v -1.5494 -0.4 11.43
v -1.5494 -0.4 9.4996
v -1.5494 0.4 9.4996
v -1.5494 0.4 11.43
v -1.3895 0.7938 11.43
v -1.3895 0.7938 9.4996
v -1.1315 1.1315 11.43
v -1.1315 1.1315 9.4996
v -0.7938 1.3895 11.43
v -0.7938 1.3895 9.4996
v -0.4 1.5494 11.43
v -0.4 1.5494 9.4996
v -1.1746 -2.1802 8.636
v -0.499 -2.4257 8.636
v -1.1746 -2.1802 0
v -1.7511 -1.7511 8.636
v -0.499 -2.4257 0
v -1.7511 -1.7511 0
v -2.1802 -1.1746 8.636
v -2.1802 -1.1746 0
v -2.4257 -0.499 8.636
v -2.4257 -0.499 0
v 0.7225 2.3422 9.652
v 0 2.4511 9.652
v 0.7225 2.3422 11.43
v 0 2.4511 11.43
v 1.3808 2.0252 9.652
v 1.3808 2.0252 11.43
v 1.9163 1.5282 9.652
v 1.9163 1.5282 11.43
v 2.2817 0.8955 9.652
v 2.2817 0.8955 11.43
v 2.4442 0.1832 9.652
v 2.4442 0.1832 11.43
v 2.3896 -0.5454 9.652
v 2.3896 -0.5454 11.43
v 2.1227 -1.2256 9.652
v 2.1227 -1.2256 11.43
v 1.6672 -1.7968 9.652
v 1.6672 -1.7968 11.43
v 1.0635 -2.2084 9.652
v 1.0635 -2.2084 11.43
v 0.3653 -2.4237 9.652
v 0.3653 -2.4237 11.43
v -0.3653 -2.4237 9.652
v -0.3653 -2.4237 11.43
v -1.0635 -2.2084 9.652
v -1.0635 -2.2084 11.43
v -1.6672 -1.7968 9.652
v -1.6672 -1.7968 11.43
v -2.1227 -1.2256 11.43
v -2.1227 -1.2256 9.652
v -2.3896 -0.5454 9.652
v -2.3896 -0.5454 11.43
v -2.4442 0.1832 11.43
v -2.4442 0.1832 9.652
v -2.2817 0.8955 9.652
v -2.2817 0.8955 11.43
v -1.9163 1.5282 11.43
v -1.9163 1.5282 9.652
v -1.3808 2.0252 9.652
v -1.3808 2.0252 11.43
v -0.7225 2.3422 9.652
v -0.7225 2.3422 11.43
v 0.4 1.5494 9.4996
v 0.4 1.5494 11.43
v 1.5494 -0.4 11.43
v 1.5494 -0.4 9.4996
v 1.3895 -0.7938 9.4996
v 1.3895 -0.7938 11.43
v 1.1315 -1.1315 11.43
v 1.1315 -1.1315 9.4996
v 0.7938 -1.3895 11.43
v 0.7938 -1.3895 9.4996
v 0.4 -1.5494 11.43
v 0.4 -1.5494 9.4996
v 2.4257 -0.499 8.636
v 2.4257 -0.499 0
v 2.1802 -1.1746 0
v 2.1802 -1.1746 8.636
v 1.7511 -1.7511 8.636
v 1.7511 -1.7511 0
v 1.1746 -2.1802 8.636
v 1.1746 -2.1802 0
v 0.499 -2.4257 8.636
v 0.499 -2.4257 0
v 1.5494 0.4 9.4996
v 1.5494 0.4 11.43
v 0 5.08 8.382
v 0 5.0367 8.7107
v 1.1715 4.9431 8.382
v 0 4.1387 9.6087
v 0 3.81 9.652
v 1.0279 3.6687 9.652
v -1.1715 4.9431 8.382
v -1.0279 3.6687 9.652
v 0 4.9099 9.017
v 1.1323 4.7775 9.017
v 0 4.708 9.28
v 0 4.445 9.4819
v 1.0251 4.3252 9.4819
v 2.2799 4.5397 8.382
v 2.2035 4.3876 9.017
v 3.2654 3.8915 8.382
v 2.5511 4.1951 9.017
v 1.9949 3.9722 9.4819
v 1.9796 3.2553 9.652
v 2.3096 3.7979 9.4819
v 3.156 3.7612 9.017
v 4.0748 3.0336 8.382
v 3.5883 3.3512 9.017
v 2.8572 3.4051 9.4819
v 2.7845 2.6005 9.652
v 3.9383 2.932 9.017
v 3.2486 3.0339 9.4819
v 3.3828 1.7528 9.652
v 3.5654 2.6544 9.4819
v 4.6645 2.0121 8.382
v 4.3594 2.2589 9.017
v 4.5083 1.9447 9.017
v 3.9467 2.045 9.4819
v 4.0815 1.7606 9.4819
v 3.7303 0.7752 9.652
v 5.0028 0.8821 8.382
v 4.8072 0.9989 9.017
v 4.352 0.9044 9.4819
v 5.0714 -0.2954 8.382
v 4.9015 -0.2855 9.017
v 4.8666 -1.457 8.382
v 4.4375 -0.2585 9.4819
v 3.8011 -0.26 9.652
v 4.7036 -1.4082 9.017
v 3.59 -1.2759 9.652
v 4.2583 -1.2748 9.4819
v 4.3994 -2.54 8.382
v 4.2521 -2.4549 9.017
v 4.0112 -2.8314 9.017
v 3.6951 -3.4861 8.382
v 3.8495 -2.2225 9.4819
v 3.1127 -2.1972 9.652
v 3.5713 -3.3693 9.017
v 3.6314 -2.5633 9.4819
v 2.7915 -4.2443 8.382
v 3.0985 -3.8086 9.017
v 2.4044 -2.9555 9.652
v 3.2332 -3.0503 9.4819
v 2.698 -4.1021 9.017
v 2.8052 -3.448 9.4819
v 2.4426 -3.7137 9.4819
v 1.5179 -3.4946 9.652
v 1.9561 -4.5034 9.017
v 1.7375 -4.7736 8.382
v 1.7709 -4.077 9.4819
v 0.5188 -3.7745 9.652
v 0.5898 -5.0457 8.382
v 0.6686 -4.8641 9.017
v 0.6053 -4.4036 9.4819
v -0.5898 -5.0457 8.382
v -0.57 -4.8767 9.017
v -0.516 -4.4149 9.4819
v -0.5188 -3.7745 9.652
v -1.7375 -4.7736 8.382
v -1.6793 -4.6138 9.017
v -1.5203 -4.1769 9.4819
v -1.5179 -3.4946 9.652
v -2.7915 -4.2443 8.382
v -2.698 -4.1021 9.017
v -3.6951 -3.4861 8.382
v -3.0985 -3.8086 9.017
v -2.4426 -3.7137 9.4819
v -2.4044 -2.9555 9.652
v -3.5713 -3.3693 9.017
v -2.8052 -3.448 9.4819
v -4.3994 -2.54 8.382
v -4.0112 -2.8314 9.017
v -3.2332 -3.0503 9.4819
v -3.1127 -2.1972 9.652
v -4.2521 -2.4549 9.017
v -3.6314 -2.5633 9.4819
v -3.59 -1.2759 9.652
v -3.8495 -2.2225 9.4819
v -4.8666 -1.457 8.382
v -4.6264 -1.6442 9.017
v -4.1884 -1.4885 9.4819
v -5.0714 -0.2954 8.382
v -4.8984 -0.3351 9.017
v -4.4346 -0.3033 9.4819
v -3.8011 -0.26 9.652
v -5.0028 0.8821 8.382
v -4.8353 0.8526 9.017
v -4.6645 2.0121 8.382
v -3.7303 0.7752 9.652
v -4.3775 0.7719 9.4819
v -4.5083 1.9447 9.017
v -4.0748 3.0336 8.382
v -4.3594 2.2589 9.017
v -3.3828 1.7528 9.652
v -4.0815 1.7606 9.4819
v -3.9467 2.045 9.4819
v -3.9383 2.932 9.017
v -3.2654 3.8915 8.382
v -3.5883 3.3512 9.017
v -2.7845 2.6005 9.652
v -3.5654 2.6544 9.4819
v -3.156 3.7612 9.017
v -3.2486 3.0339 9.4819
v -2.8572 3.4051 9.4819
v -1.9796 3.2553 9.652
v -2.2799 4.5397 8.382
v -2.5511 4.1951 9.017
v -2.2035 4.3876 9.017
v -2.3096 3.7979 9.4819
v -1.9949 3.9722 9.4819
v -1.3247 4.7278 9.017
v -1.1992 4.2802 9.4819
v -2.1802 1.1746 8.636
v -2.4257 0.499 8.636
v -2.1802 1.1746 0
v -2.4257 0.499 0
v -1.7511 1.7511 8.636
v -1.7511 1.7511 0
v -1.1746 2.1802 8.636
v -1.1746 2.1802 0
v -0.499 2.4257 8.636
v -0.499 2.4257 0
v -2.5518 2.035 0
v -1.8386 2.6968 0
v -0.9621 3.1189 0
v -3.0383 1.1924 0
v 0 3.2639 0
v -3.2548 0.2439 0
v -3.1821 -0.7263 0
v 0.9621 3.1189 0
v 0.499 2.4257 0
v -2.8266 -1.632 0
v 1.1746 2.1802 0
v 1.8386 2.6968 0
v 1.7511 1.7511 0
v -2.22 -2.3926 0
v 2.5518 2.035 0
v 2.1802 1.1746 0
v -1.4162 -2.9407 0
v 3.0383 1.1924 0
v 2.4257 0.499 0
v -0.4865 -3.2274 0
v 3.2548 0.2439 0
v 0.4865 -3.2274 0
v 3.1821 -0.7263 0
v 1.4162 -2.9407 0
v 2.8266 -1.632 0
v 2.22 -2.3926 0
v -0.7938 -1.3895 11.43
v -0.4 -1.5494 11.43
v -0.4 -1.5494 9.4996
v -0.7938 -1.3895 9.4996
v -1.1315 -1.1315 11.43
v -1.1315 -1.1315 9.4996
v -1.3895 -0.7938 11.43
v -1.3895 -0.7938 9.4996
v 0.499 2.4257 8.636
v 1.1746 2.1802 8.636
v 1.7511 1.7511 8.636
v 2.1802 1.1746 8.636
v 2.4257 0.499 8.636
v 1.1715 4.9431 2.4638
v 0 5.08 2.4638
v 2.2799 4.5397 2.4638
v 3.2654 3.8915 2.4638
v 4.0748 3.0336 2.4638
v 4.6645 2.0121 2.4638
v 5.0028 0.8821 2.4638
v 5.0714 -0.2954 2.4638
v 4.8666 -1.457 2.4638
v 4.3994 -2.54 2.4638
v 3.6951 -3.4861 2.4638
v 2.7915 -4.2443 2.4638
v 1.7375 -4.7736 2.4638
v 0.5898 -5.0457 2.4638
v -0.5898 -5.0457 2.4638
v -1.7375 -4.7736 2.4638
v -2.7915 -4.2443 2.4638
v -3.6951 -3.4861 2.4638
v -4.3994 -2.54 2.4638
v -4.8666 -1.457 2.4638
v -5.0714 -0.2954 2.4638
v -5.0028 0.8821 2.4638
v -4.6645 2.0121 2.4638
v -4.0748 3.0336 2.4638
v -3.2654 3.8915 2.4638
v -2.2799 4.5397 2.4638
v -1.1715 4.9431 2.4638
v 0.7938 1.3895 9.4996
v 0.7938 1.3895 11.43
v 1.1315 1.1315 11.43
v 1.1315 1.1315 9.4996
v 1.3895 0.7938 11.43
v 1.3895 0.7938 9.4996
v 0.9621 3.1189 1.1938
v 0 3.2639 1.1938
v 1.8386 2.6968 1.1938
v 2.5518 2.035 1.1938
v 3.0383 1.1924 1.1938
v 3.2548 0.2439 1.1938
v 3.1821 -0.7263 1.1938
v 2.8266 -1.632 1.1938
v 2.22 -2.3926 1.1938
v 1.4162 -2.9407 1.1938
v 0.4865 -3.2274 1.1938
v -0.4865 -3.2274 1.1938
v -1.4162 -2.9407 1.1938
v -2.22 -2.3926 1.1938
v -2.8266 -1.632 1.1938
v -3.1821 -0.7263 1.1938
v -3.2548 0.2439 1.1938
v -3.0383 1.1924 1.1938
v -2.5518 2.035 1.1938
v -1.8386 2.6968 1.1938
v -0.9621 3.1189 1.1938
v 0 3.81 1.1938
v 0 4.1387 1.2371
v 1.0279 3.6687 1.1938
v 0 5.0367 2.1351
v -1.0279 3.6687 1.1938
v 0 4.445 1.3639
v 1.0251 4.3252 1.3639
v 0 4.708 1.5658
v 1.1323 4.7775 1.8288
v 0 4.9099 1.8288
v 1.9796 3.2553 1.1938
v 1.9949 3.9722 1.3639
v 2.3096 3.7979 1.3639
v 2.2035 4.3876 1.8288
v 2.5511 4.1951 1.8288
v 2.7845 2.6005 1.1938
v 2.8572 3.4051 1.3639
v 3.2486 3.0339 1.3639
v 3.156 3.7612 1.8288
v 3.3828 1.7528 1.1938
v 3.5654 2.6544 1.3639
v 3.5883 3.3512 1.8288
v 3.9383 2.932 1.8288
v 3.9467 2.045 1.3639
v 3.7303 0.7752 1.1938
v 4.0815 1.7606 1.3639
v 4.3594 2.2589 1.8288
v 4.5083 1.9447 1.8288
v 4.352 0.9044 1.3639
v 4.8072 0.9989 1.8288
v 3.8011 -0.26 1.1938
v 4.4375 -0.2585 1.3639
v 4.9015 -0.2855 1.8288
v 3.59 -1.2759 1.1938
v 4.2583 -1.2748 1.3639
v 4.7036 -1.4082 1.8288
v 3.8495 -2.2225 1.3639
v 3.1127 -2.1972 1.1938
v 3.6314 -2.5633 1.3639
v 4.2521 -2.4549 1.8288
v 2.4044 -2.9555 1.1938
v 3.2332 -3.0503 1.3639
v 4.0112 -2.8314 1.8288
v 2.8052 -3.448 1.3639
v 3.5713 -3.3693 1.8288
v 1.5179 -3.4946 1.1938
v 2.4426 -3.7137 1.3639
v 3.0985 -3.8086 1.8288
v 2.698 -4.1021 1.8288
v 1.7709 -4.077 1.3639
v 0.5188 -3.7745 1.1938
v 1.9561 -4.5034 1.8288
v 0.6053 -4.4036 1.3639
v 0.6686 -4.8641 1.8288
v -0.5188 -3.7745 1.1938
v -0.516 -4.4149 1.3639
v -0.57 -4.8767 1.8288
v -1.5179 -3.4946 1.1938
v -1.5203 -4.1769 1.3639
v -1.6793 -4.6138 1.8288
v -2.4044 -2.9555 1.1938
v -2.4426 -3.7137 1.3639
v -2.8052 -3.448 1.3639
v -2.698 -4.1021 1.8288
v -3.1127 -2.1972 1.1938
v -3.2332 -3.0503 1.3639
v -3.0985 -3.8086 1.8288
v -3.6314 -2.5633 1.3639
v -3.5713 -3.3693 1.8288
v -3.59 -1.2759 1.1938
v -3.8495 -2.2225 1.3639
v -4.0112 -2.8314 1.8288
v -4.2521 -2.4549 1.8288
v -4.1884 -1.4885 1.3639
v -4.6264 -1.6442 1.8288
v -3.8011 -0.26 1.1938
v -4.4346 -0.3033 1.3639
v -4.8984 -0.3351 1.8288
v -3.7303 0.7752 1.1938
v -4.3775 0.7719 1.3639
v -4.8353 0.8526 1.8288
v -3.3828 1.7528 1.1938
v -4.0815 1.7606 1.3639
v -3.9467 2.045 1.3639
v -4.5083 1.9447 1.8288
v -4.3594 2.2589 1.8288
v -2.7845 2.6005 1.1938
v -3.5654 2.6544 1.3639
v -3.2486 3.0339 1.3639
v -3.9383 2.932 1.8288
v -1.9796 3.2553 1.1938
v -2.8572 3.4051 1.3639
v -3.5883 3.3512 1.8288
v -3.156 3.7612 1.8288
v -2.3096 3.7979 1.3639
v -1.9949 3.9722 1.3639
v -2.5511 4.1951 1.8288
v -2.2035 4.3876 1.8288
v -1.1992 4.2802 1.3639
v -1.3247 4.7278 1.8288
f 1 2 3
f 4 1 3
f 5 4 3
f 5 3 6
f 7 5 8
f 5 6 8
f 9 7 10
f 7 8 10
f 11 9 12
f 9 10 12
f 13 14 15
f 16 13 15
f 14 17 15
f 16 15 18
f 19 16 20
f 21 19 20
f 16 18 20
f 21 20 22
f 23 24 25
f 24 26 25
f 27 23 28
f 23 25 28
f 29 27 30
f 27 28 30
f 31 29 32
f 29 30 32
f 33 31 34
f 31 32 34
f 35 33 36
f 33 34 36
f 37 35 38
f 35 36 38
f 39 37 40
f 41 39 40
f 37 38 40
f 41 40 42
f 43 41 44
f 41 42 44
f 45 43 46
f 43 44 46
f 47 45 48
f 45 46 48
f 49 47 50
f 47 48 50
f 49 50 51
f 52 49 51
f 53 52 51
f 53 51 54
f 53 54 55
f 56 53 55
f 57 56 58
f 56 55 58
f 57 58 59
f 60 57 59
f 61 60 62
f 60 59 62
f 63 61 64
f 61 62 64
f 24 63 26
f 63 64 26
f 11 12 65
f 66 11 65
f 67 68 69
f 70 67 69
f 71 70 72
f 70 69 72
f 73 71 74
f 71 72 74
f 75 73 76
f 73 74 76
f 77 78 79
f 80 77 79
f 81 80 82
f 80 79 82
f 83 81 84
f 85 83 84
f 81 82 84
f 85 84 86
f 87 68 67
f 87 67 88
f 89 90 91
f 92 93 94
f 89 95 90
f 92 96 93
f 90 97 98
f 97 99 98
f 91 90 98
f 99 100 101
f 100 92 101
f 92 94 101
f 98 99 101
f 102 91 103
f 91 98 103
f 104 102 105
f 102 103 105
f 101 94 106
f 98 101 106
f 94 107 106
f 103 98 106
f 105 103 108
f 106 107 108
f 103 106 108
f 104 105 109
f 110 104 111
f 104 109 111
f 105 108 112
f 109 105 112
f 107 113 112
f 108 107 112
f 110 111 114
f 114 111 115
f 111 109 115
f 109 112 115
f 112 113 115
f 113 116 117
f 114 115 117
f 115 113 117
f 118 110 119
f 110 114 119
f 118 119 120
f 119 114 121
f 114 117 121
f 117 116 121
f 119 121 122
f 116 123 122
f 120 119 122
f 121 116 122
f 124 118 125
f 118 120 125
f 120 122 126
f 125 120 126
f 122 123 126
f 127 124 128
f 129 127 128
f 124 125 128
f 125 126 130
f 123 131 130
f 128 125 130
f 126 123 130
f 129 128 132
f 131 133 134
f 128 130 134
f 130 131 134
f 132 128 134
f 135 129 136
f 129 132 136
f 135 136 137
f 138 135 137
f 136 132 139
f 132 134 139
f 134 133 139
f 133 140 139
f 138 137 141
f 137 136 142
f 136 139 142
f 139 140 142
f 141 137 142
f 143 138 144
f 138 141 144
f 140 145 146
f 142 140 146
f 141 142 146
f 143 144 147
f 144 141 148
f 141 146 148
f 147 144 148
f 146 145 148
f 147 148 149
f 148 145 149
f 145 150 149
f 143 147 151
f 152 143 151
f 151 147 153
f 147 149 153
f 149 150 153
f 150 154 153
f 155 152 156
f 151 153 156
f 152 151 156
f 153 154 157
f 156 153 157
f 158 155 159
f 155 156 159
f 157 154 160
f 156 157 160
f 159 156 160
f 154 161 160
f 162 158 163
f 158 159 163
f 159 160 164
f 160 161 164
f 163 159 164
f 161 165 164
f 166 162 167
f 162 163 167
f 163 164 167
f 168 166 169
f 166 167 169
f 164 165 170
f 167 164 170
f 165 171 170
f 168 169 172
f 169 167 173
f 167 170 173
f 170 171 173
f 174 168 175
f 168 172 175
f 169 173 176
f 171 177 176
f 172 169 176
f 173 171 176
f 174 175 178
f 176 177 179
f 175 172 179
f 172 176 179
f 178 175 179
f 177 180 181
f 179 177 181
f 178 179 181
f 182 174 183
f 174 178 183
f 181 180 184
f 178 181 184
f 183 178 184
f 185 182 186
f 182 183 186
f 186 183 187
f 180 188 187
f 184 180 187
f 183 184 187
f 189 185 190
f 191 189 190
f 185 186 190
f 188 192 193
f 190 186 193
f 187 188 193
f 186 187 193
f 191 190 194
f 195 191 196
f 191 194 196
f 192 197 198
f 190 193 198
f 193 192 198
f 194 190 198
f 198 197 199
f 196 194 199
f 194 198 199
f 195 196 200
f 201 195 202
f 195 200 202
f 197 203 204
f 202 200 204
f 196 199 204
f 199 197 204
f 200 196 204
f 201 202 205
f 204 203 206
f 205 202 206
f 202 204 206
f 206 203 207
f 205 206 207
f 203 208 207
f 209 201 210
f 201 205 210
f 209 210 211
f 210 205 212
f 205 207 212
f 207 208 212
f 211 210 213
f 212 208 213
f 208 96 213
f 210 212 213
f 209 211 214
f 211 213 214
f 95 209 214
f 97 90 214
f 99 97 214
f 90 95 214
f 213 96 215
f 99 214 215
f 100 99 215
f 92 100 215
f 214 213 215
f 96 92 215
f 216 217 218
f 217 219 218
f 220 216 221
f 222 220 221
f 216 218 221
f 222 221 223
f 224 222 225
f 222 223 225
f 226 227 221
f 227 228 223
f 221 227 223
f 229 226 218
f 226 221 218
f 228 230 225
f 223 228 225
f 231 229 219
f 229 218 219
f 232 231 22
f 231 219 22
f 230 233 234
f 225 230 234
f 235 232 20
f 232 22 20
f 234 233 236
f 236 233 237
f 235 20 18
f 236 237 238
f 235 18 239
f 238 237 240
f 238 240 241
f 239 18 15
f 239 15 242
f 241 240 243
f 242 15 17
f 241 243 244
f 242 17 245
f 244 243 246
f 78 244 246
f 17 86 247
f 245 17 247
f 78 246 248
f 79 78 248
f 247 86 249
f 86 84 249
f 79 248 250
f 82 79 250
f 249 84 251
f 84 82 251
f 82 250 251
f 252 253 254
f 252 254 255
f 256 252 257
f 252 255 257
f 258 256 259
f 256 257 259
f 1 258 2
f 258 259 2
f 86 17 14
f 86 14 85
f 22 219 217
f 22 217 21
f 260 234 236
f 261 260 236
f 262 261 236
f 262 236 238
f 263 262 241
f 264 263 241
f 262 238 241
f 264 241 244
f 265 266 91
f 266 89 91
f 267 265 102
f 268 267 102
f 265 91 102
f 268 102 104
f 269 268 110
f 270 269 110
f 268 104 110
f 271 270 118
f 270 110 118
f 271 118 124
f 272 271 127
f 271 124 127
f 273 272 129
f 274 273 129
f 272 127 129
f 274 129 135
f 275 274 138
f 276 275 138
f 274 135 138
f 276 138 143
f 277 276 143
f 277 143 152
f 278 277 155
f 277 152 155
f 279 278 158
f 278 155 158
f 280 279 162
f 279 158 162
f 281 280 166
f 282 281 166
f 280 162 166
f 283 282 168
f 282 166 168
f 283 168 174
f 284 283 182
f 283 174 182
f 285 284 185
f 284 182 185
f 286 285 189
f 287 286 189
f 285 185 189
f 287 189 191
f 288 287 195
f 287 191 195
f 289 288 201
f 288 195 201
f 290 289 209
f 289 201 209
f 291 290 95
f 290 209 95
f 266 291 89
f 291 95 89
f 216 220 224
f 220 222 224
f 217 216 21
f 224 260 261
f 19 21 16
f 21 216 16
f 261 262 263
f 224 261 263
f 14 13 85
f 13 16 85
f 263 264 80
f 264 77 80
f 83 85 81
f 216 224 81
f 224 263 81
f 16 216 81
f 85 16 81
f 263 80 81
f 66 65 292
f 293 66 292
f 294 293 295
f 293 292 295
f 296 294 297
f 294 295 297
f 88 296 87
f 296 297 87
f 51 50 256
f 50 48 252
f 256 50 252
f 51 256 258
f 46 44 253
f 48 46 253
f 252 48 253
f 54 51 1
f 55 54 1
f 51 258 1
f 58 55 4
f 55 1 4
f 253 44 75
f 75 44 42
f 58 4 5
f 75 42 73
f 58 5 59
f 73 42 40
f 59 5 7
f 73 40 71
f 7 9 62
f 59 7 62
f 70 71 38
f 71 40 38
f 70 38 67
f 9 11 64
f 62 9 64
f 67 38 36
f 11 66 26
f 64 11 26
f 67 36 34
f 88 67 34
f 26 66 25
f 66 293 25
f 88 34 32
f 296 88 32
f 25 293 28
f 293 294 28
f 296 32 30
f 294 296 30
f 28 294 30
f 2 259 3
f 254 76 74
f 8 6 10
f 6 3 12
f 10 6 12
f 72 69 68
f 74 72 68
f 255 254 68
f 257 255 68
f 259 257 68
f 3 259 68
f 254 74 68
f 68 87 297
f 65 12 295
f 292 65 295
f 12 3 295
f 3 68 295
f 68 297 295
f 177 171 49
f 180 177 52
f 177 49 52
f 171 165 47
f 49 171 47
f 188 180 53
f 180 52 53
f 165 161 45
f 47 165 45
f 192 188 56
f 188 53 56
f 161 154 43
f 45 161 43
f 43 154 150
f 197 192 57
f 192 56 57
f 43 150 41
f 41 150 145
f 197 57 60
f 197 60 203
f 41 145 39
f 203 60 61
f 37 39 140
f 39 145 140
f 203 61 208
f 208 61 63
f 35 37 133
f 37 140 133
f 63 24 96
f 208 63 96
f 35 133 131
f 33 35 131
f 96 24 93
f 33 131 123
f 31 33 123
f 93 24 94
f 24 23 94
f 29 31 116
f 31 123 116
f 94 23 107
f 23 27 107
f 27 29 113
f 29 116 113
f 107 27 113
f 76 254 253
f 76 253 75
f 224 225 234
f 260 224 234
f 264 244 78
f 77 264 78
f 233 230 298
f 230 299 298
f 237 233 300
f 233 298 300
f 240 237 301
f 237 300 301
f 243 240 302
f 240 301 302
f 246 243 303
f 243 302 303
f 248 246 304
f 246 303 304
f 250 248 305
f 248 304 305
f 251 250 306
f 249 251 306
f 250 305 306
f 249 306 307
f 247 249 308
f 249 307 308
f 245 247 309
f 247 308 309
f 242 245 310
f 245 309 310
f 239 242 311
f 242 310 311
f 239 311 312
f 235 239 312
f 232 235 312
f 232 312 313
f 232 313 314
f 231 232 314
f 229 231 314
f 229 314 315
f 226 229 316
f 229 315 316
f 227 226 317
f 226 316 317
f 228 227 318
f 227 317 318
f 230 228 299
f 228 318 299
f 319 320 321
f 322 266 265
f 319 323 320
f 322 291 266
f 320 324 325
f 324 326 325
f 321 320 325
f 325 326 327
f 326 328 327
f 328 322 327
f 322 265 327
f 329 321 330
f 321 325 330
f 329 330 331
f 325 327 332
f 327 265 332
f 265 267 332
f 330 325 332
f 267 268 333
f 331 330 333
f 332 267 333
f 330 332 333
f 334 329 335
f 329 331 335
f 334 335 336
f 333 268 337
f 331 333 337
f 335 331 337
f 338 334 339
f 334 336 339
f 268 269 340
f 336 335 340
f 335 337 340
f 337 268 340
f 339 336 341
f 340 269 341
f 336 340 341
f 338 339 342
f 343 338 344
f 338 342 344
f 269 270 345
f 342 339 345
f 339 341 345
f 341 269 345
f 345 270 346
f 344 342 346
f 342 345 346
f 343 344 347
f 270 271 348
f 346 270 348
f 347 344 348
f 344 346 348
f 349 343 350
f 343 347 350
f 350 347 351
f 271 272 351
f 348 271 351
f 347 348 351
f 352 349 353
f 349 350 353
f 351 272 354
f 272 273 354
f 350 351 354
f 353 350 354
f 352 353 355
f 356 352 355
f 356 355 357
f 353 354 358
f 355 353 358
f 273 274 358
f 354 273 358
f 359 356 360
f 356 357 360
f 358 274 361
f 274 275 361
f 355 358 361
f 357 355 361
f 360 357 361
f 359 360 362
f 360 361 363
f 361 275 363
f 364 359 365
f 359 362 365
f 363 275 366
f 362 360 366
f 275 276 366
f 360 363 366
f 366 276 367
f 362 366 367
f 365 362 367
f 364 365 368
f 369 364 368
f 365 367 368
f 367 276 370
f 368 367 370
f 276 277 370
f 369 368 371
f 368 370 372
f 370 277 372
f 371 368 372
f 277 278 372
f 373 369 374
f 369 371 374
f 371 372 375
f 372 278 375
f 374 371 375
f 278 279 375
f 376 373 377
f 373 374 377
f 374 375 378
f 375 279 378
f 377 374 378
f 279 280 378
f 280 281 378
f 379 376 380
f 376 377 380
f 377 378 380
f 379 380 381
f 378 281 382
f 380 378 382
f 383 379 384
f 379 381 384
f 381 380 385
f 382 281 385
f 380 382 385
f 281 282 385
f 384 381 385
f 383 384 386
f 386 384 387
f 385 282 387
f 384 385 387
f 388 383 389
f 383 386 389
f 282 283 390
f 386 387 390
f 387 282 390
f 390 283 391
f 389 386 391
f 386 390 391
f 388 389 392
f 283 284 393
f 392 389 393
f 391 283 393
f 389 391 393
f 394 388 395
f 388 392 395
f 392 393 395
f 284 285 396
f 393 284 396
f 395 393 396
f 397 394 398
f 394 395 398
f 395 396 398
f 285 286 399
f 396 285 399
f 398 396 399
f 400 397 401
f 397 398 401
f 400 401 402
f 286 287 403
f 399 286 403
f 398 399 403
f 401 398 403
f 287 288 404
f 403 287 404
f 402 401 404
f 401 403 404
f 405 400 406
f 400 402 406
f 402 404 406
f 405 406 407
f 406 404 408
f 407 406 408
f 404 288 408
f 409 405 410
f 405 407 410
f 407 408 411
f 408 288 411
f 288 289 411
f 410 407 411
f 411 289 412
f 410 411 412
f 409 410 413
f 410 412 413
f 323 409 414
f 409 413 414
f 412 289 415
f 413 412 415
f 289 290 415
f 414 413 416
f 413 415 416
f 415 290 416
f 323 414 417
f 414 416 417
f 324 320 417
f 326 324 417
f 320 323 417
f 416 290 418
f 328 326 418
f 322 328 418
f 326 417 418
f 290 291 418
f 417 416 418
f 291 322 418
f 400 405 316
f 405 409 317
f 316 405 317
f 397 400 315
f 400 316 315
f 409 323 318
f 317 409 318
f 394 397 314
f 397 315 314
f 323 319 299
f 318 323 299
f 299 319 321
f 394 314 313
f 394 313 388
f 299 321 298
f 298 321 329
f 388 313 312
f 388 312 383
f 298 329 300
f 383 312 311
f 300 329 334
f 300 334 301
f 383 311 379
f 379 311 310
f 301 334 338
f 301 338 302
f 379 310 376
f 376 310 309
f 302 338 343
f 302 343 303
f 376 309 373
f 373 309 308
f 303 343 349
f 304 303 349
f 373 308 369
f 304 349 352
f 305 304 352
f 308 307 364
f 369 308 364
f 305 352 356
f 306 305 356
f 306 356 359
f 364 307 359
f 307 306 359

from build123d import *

# Parameters (mm, degrees)
F2_W     = 0.998062
F2_H     = 0.0508
F2_W_2   = 0.0508
F2_H_2   = 0.998062
F3_DEPTH = 8.636
F4_W     = 0.8
F4_H     = 0.0508
F4_W_2   = 0.0508
F4_H_2   = 0.8
F5_DEPTH = 1.9304


with BuildPart() as f1:
    # F0 (on Right) → F1 (revolve)
    with BuildSketch(Plane.YZ):
        with BuildLine():
            Line((2.4765, 8.636), (2.4765, 0))
            Line((2.4765, 0), (3.2639, 0))
            Line((3.2639, 0), (3.2639, 1.1938))
            Line((3.2639, 1.1938), (3.81, 1.1938))
            ThreePointArc((3.81, 1.1938), (4.708026, 1.565774), (5.08, 2.4638))
            Line((5.08, 2.4638), (5.08, 8.382))
            ThreePointArc((5.08, 8.382), (4.708026, 9.280026), (3.81, 9.652))
            Line((3.81, 9.652), (2.4511, 9.652))
            Line((2.4511, 9.652), (2.4511, 11.43))
            Line((2.4511, 11.43), (1.6002, 11.43))
            Line((1.6002, 11.43), (1.6002, 9.4996))
            Line((1.6002, 9.4996), (0, 9.4996))
            Line((0, 9.4996), (0, 8.636))
            Line((0, 8.636), (2.4765, 8.636))
        make_face()
    revolve(axis=Axis((0, 0, 4.318), (0, 0, -1)))

    # F2 (on face) → F3 (join, through all)
    with BuildSketch(Plane(origin=(0, 0, 0), x_dir=(1, 0, 0), z_dir=(0, 0, -1))):
        with Locations((0, 2.4511)):
            Rectangle(F2_W, F2_H)
        with Locations((2.4511, 0)):
            Rectangle(F2_W_2, F2_H_2)
        with Locations((0, -2.4511)):
            Rectangle(F2_W, F2_H)
        with Locations((-2.4511, 0)):
            Rectangle(F2_W_2, F2_H_2)
    extrude(amount=-F3_DEPTH)

    # F4 (on face) → F5 (join, through all)
    with BuildSketch(Plane.XY.offset(11.43)):
        with Locations((0, -1.5748)):
            Rectangle(F4_W, F4_H)
        with Locations((-1.5748, 0)):
            Rectangle(F4_W_2, F4_H_2)
        with Locations((0, 1.5748)):
            Rectangle(F4_W, F4_H)
        with Locations((1.5748, 0)):
            Rectangle(F4_W_2, F4_H_2)
    extrude(amount=-F5_DEPTH)


solid = f1.part
